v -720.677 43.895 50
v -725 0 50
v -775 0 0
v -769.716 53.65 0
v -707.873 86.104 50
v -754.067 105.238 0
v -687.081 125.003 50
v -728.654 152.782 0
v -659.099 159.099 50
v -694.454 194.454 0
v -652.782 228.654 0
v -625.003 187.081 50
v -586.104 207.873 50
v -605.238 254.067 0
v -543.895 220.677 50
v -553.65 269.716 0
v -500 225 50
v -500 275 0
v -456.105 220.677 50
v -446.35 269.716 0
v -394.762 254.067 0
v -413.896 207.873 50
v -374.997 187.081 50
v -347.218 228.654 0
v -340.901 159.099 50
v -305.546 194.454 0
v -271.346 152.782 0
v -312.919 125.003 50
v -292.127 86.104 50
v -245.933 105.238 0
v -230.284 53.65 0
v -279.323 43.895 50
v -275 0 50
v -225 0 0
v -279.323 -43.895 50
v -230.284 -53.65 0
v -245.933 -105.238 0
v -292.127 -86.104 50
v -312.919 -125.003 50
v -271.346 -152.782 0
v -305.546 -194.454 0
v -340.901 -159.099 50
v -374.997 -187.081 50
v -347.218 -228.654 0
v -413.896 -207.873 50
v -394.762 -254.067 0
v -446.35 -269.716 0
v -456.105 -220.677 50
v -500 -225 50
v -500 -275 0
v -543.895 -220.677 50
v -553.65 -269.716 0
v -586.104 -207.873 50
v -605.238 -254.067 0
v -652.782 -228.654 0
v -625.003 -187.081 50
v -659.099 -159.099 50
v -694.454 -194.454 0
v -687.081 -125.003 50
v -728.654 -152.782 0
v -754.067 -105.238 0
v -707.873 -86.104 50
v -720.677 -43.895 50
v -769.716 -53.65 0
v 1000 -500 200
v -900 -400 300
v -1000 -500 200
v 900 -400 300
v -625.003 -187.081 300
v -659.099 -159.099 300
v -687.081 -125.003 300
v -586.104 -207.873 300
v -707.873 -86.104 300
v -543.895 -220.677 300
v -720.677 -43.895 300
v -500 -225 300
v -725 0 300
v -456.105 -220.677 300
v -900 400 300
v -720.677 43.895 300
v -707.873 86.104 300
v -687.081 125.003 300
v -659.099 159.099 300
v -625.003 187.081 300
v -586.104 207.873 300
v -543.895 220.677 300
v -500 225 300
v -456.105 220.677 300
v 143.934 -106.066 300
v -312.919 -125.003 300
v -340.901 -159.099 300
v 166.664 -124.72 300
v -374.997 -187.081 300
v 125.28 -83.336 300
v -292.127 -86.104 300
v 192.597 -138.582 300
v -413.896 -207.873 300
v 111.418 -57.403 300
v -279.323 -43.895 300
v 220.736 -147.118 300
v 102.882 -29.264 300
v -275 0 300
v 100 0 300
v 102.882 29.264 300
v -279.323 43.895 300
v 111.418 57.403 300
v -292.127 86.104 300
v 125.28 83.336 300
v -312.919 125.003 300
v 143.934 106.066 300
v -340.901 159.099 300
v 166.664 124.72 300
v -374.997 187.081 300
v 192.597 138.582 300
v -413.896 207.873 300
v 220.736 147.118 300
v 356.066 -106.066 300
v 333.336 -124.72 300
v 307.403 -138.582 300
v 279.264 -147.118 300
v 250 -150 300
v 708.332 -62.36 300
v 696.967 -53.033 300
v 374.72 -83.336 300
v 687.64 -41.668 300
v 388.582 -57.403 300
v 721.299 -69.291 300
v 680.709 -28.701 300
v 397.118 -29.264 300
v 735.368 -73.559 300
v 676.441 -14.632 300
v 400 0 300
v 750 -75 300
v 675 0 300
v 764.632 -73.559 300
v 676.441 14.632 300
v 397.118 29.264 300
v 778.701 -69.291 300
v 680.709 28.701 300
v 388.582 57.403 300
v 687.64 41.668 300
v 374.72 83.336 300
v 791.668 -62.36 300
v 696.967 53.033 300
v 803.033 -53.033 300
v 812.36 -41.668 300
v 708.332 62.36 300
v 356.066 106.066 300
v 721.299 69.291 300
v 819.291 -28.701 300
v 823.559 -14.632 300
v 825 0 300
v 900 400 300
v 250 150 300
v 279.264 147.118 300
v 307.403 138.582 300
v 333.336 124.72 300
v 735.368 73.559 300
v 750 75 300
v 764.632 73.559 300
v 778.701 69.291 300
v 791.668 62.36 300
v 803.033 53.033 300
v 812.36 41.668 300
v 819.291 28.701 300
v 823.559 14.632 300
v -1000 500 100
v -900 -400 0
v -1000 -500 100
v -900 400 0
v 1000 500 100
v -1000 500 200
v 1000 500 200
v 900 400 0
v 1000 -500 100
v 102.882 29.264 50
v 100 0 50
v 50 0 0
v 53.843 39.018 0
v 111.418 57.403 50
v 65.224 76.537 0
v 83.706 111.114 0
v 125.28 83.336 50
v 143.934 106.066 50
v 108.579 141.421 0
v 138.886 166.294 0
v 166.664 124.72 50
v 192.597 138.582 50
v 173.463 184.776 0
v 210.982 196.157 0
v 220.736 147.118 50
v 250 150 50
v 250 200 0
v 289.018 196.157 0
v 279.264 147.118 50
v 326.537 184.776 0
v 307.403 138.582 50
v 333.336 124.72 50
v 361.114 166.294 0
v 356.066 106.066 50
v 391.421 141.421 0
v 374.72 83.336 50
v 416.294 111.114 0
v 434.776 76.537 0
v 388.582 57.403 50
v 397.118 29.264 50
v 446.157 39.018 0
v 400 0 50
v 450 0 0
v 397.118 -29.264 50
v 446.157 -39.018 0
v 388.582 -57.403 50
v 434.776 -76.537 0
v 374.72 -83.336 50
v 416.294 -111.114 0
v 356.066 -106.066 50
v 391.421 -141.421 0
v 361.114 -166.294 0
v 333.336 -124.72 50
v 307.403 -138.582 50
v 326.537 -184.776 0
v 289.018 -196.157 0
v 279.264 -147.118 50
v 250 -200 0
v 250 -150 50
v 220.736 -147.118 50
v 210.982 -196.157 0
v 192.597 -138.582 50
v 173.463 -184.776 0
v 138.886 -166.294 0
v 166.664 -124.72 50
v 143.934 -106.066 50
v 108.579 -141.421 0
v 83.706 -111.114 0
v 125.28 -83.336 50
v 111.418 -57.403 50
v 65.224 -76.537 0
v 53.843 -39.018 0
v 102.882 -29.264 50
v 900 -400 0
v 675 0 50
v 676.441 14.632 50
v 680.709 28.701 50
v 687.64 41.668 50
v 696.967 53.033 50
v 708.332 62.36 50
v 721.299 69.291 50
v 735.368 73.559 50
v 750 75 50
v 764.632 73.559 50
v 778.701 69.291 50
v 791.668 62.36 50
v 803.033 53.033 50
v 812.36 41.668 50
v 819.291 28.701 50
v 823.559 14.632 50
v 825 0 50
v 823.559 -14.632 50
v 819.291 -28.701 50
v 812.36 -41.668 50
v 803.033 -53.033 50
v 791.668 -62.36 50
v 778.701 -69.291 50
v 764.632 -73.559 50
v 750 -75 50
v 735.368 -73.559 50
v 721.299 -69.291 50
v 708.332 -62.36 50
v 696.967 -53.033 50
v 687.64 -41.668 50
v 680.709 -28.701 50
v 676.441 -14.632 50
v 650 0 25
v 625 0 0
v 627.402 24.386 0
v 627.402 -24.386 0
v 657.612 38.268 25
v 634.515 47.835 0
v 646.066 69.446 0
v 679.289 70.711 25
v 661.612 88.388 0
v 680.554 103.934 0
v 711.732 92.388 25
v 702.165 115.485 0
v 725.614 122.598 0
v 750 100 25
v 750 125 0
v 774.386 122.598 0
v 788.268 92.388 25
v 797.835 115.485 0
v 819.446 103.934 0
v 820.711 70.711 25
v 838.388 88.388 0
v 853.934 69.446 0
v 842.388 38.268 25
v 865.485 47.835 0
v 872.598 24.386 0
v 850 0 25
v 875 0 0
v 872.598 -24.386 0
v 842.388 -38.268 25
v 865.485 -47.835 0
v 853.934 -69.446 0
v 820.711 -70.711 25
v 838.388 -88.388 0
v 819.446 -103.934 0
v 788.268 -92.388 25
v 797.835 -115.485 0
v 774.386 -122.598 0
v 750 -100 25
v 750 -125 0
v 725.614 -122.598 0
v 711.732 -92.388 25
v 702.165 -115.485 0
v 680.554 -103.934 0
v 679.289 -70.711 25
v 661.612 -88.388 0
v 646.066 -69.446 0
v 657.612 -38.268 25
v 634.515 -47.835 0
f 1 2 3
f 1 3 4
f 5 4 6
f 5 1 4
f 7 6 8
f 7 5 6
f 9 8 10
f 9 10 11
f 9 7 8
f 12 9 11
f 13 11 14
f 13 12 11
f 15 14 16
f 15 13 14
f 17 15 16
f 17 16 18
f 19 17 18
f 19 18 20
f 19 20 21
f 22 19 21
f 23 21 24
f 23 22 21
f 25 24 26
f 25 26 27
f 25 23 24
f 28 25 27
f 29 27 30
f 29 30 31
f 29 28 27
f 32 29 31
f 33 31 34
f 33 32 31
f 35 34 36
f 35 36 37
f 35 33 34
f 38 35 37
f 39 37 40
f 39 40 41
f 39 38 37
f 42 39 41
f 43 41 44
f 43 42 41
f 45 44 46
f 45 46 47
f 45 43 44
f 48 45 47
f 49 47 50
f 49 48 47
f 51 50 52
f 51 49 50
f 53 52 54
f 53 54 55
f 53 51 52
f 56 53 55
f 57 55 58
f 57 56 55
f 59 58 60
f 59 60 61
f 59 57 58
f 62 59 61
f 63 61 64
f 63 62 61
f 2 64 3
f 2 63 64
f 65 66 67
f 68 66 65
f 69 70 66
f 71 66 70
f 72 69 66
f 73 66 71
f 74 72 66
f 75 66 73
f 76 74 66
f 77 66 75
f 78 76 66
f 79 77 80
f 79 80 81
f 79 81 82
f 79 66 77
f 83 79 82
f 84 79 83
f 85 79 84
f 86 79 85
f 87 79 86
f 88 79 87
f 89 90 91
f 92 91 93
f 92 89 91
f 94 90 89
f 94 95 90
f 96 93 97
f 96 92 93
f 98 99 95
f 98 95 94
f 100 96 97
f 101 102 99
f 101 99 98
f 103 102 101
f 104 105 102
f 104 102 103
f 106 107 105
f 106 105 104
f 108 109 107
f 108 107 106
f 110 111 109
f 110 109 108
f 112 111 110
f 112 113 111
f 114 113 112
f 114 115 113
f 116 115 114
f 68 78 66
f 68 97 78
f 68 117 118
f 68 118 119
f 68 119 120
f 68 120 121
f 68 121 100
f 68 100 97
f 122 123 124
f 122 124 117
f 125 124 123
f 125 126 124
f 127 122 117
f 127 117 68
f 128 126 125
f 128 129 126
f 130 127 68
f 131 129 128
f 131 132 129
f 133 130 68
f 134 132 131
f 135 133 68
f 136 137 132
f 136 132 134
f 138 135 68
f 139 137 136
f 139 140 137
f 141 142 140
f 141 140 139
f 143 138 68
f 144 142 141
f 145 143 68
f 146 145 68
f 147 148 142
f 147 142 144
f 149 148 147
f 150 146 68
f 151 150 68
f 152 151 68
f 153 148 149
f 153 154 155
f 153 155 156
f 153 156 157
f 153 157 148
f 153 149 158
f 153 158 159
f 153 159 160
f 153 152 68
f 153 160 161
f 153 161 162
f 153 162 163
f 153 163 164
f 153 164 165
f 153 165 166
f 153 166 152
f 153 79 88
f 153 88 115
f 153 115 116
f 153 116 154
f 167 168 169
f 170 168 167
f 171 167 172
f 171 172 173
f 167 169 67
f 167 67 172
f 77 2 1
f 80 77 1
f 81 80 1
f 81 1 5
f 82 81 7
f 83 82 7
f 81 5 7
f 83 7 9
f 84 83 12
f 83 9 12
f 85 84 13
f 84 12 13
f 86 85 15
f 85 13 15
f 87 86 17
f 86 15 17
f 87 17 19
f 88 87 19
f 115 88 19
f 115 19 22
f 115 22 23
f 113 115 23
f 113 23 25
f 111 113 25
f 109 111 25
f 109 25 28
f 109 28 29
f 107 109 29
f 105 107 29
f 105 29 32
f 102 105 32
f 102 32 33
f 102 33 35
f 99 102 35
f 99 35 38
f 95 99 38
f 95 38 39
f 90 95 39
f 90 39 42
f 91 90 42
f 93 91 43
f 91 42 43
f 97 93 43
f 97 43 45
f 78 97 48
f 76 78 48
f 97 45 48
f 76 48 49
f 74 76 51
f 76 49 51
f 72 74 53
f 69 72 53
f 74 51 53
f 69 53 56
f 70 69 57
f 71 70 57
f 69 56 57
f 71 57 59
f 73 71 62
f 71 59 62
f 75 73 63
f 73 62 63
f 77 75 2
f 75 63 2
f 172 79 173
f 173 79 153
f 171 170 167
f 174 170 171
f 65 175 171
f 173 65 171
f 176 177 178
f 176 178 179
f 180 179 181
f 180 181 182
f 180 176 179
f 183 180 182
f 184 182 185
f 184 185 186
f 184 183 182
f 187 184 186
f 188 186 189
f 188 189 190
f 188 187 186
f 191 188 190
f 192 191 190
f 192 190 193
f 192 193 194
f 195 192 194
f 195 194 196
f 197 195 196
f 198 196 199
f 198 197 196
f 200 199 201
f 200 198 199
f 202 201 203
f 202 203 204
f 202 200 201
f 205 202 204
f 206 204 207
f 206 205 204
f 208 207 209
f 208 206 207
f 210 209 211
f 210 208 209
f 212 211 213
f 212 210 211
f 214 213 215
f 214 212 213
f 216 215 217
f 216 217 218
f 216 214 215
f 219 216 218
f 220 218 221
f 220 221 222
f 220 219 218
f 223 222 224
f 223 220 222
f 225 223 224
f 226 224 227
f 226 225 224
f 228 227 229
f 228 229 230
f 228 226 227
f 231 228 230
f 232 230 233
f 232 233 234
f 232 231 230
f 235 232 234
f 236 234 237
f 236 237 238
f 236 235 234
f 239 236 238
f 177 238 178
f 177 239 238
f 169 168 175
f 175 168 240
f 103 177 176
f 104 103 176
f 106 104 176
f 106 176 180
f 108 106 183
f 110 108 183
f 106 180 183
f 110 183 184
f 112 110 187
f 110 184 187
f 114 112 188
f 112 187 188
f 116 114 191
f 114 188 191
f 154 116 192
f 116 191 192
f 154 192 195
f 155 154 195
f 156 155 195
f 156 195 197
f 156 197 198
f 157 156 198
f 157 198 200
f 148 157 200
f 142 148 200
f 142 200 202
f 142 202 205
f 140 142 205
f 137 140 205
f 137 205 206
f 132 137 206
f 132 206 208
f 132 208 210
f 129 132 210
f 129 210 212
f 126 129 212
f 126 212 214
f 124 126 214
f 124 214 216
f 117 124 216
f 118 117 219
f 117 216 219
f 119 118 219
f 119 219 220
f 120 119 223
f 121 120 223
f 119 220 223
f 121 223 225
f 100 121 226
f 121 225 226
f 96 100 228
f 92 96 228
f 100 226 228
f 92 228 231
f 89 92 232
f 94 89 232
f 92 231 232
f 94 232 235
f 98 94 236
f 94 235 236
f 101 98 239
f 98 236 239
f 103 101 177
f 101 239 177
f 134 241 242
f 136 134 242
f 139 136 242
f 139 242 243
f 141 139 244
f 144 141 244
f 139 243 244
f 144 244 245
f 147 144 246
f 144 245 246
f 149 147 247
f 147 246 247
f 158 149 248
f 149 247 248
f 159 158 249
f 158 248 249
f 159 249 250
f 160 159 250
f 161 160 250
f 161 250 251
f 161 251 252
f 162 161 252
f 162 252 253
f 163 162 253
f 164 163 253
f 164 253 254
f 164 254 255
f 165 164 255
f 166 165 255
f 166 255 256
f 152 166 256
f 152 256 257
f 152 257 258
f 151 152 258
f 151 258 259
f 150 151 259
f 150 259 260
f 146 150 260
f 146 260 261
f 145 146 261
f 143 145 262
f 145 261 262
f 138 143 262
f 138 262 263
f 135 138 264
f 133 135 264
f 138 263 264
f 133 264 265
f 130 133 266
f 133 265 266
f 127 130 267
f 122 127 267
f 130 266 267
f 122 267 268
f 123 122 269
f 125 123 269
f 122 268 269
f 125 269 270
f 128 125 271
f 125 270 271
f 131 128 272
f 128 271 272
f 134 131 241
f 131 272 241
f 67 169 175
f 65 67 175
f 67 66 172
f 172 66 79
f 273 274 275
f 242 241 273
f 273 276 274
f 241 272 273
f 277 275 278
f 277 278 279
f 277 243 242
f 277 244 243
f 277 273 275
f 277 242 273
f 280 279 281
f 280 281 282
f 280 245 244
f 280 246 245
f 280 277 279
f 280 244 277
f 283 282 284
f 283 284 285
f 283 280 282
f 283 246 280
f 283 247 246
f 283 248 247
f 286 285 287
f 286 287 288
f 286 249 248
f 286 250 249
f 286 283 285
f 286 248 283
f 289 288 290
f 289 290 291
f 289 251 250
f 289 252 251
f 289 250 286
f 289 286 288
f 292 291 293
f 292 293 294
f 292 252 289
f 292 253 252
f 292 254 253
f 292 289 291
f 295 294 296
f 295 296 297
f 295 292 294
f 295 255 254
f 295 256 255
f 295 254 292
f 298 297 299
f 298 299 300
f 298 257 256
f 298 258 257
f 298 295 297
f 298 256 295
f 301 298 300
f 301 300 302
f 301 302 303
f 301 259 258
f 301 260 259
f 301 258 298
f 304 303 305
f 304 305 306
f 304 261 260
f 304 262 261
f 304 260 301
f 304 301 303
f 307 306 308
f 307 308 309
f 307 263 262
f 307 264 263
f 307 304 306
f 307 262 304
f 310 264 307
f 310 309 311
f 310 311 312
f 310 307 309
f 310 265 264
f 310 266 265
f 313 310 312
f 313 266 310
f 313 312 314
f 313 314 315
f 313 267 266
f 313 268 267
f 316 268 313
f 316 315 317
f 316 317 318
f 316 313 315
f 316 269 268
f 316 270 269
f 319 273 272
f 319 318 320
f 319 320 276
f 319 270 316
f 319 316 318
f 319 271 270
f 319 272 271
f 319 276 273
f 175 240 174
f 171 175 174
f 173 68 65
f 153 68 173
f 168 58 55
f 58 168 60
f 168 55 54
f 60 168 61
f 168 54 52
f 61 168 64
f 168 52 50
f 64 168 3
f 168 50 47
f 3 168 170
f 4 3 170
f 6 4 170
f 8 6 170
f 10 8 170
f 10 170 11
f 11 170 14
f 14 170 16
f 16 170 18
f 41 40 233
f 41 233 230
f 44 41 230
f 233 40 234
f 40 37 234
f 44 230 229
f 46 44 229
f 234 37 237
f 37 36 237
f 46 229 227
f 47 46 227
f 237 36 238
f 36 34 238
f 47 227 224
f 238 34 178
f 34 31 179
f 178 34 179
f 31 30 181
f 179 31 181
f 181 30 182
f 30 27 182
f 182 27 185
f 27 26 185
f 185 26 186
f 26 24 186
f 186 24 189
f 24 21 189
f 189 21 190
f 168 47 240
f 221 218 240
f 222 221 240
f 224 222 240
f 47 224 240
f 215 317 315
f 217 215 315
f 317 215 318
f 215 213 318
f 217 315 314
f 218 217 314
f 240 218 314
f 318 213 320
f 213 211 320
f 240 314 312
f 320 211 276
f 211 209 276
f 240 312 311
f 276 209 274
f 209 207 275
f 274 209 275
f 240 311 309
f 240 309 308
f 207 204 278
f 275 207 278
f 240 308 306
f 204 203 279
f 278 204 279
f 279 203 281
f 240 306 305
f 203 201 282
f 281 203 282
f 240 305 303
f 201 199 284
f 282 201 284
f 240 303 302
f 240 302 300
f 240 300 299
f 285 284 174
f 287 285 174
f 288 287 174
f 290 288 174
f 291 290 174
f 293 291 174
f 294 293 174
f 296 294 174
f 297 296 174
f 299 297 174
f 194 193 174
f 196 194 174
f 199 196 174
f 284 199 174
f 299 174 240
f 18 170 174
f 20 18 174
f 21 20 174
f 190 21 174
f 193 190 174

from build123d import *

# Parameters (mm, degrees)
ESQUISSE1_W             = 2000
ESQUISSE1_H             = 1000
BOSS_EXTRU_1_DEPTH      = 300
CHANFREIN1_SIZE         = 100
ESQUISSE2_R             = 75
ESQUISSE2_R_2           = 225
ESQUISSE2_R_3           = 150
ENL_V_MAT_EXTRU_1_DEPTH = 1158.583690279
CHANFREIN2_SIZE         = 50


with BuildPart() as part:
    # Esquisse1 → Boss.-Extru.1 (new body)
    with BuildSketch(Plane.XY):
        Rectangle(ESQUISSE1_W, ESQUISSE1_H)
    extrude(amount=BOSS_EXTRU_1_DEPTH)

    # Chanfrein1
    chanfrein1_edges = [part.edges().sort_by_distance(p)[0] for p in [
        (-1000, 0, 300),
        (0, -500, 300),
        (1000, 0, 300),
        (0, -500, 0),
        (-1000, 0, 0),
        (0, 500, 0),
        (1000, 0, 0),
        (0, 500, 300),
    ]]
    chamfer(chanfrein1_edges, length=CHANFREIN1_SIZE)

    # Esquisse2 → Enlèv. mat.-Extru.1 (cut, through all)
    with BuildSketch(Plane(origin=(0, 0, 0), x_dir=(-1, 0, 0), z_dir=(0, 0, -1))):
        with Locations((-750, 0)):
            Circle(ESQUISSE2_R)
        with Locations((500, 0)):
            Circle(ESQUISSE2_R_2)
        with Locations((-250, 0)):
            Circle(ESQUISSE2_R_3)
    extrude(amount=-ENL_V_MAT_EXTRU_1_DEPTH, mode=Mode.SUBTRACT)

    # Chanfrein2
    chanfrein2_edges = [part.edges().sort_by_distance(p)[0] for p in [
        (825, 0, 0),
        (400, 0, 0),
        (-275, 0, 0),
    ]]
    chamfer(chanfrein2_edges, length=CHANFREIN2_SIZE)


solid = part.part
